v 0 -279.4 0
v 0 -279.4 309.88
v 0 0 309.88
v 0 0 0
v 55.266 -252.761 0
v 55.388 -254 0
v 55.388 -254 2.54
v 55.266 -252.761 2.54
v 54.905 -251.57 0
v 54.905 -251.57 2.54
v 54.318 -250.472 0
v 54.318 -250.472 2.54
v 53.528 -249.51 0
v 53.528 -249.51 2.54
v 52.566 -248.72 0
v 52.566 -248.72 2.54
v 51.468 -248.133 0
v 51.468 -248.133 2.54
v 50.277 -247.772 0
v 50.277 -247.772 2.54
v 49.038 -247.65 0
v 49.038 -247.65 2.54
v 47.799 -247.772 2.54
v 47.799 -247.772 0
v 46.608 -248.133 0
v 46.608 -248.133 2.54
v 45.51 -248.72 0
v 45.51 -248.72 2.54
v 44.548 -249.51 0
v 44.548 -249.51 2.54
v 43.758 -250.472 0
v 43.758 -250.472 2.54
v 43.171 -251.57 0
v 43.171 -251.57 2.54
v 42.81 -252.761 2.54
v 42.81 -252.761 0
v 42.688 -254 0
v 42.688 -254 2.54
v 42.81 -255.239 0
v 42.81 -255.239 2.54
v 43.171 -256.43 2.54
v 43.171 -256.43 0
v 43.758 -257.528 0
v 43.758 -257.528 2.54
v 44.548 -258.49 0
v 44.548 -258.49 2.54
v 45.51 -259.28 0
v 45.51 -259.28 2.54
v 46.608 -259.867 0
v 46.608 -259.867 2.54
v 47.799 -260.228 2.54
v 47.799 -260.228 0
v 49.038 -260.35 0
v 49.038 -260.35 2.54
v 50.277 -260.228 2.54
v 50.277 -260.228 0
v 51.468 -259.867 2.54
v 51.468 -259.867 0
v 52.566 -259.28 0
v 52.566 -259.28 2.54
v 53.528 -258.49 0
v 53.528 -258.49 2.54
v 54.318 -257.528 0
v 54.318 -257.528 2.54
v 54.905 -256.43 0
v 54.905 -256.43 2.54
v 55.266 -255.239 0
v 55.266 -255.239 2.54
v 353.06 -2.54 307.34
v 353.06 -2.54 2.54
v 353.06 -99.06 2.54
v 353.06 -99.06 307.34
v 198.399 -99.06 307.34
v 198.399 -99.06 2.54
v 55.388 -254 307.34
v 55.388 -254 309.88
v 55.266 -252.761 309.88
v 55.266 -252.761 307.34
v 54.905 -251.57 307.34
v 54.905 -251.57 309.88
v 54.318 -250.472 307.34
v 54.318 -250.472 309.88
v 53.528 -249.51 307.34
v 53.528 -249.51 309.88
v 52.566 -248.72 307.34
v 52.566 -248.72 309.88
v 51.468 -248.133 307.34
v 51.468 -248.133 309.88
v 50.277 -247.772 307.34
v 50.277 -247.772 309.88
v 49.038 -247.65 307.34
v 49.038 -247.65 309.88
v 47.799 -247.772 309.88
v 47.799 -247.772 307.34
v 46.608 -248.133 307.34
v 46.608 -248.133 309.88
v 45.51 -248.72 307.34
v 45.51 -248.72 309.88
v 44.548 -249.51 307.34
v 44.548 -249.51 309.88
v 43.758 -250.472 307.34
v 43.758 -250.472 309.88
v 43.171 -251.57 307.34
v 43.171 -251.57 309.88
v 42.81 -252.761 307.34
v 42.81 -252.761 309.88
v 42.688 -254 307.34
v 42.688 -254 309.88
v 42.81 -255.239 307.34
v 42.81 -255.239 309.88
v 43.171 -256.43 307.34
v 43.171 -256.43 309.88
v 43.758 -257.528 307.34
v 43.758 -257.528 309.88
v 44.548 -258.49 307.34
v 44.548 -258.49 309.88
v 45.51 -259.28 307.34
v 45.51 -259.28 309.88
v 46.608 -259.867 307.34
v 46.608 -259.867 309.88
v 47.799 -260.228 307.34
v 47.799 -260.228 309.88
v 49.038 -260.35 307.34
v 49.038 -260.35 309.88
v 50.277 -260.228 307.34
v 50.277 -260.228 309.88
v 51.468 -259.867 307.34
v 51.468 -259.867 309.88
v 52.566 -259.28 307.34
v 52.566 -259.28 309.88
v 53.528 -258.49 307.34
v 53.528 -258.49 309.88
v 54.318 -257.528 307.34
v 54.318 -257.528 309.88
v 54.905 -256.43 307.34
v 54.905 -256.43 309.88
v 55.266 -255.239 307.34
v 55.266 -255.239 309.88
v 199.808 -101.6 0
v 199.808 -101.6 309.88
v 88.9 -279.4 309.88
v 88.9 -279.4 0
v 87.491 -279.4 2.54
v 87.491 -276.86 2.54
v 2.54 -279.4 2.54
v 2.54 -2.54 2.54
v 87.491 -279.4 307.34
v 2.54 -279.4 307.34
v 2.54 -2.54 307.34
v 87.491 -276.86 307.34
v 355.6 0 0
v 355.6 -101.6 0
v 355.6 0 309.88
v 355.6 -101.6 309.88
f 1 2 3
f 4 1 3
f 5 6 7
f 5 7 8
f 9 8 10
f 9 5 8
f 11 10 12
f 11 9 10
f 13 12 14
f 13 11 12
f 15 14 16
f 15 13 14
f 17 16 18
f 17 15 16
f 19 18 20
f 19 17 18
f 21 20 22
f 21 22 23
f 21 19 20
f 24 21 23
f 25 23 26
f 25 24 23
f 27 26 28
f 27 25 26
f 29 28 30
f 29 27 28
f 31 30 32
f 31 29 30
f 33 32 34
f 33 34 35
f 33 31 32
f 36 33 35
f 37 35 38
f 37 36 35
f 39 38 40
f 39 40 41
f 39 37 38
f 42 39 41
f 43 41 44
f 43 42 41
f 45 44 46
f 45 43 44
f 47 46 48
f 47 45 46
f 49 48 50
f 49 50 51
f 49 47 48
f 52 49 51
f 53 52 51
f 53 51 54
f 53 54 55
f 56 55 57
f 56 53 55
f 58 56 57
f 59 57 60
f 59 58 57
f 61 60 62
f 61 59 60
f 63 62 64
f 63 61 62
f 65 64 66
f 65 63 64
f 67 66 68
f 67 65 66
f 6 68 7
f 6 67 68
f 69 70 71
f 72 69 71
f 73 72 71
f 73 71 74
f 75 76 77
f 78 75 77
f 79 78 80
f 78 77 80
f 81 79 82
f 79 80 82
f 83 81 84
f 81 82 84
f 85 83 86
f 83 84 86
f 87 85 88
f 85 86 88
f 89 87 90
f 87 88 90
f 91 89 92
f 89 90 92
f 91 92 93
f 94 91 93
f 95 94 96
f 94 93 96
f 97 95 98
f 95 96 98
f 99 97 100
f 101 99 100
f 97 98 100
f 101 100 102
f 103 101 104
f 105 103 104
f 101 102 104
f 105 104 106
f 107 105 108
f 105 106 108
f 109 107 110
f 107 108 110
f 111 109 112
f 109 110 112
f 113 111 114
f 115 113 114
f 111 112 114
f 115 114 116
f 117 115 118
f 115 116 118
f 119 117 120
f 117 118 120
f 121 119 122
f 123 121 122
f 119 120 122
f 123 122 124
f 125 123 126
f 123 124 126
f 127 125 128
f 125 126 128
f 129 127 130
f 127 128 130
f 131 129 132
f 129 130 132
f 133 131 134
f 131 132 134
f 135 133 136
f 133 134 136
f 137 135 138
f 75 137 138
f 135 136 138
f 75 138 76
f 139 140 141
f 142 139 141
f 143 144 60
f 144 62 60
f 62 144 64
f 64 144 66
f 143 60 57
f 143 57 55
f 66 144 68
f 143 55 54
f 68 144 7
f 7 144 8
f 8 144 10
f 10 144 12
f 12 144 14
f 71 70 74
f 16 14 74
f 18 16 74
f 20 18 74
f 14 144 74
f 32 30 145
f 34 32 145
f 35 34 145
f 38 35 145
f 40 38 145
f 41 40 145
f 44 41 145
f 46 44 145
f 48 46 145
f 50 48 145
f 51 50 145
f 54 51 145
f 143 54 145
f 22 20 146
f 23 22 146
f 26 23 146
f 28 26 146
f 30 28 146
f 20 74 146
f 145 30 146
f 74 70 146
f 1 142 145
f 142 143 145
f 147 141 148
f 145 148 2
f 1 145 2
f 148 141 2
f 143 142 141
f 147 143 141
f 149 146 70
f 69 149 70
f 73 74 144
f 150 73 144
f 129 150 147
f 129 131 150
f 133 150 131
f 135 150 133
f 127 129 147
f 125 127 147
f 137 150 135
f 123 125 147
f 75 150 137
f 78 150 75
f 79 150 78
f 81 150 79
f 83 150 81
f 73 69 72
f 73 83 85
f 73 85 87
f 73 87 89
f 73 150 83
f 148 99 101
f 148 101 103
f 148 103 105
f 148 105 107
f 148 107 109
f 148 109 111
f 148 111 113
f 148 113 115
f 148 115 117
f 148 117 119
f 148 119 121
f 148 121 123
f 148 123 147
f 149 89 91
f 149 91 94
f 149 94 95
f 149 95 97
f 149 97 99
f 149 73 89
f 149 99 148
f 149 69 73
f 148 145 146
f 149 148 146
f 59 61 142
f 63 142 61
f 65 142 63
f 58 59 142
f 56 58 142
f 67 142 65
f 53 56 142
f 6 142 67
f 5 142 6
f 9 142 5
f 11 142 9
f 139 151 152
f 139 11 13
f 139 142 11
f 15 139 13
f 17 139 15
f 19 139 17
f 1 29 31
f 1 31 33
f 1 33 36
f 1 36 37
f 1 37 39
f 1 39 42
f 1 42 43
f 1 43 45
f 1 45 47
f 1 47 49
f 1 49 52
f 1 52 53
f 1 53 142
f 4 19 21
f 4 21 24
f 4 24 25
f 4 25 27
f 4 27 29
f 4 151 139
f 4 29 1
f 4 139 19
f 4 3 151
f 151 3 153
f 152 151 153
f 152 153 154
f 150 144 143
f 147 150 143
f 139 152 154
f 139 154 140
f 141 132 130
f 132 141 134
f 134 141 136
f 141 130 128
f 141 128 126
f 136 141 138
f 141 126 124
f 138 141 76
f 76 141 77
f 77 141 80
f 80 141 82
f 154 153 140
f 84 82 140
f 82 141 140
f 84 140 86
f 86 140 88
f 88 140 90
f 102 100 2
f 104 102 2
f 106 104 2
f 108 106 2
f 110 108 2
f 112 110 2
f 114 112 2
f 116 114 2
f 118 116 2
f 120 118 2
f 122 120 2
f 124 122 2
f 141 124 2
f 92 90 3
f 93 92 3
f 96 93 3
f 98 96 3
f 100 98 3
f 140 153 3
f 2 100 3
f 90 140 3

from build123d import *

# Parameters (mm, degrees)
SKETCH2_R           = 6.35
BOSS_EXTRUDE1_DEPTH = 2.54
BOSS_EXTRUDE2_DEPTH = 304.8


with BuildPart() as part:
    # Sketch2 → Boss-Extrude1 (new body)
    with BuildSketch(Plane.XY):
        Polygon((0, 0), (355.6, 0), (355.6, -101.6), (199.80781759, -101.6), (88.9, -279.4), (0, -279.4), align=None)
        with Locations((49.038050814, -254)):
            Circle(SKETCH2_R, mode=Mode.SUBTRACT)
    boss_extrude1 = extrude(amount=BOSS_EXTRUDE1_DEPTH)

    # Sketch3 → Boss-Extrude2 (add)
    with BuildSketch(Plane.XY.offset(2.54)):
        Polygon((2.54, -279.4), (2.54, -276.86), (2.54, -2.54), (353.06, -2.54), (353.06, -99.06), (198.398569196, -99.06), (87.490751606, -276.86), (87.490751606, -279.4), (88.9, -279.4), (199.80781759, -101.6), (355.6, -101.6), (355.6, 0), (0, 0), (0, -279.4), align=None)
    extrude(amount=BOSS_EXTRUDE2_DEPTH)

    # Mirror1: Boss-Extrude1 across plane
    add(boss_extrude1.mirror(Plane.XY.offset(154.94)))


solid = part.part
